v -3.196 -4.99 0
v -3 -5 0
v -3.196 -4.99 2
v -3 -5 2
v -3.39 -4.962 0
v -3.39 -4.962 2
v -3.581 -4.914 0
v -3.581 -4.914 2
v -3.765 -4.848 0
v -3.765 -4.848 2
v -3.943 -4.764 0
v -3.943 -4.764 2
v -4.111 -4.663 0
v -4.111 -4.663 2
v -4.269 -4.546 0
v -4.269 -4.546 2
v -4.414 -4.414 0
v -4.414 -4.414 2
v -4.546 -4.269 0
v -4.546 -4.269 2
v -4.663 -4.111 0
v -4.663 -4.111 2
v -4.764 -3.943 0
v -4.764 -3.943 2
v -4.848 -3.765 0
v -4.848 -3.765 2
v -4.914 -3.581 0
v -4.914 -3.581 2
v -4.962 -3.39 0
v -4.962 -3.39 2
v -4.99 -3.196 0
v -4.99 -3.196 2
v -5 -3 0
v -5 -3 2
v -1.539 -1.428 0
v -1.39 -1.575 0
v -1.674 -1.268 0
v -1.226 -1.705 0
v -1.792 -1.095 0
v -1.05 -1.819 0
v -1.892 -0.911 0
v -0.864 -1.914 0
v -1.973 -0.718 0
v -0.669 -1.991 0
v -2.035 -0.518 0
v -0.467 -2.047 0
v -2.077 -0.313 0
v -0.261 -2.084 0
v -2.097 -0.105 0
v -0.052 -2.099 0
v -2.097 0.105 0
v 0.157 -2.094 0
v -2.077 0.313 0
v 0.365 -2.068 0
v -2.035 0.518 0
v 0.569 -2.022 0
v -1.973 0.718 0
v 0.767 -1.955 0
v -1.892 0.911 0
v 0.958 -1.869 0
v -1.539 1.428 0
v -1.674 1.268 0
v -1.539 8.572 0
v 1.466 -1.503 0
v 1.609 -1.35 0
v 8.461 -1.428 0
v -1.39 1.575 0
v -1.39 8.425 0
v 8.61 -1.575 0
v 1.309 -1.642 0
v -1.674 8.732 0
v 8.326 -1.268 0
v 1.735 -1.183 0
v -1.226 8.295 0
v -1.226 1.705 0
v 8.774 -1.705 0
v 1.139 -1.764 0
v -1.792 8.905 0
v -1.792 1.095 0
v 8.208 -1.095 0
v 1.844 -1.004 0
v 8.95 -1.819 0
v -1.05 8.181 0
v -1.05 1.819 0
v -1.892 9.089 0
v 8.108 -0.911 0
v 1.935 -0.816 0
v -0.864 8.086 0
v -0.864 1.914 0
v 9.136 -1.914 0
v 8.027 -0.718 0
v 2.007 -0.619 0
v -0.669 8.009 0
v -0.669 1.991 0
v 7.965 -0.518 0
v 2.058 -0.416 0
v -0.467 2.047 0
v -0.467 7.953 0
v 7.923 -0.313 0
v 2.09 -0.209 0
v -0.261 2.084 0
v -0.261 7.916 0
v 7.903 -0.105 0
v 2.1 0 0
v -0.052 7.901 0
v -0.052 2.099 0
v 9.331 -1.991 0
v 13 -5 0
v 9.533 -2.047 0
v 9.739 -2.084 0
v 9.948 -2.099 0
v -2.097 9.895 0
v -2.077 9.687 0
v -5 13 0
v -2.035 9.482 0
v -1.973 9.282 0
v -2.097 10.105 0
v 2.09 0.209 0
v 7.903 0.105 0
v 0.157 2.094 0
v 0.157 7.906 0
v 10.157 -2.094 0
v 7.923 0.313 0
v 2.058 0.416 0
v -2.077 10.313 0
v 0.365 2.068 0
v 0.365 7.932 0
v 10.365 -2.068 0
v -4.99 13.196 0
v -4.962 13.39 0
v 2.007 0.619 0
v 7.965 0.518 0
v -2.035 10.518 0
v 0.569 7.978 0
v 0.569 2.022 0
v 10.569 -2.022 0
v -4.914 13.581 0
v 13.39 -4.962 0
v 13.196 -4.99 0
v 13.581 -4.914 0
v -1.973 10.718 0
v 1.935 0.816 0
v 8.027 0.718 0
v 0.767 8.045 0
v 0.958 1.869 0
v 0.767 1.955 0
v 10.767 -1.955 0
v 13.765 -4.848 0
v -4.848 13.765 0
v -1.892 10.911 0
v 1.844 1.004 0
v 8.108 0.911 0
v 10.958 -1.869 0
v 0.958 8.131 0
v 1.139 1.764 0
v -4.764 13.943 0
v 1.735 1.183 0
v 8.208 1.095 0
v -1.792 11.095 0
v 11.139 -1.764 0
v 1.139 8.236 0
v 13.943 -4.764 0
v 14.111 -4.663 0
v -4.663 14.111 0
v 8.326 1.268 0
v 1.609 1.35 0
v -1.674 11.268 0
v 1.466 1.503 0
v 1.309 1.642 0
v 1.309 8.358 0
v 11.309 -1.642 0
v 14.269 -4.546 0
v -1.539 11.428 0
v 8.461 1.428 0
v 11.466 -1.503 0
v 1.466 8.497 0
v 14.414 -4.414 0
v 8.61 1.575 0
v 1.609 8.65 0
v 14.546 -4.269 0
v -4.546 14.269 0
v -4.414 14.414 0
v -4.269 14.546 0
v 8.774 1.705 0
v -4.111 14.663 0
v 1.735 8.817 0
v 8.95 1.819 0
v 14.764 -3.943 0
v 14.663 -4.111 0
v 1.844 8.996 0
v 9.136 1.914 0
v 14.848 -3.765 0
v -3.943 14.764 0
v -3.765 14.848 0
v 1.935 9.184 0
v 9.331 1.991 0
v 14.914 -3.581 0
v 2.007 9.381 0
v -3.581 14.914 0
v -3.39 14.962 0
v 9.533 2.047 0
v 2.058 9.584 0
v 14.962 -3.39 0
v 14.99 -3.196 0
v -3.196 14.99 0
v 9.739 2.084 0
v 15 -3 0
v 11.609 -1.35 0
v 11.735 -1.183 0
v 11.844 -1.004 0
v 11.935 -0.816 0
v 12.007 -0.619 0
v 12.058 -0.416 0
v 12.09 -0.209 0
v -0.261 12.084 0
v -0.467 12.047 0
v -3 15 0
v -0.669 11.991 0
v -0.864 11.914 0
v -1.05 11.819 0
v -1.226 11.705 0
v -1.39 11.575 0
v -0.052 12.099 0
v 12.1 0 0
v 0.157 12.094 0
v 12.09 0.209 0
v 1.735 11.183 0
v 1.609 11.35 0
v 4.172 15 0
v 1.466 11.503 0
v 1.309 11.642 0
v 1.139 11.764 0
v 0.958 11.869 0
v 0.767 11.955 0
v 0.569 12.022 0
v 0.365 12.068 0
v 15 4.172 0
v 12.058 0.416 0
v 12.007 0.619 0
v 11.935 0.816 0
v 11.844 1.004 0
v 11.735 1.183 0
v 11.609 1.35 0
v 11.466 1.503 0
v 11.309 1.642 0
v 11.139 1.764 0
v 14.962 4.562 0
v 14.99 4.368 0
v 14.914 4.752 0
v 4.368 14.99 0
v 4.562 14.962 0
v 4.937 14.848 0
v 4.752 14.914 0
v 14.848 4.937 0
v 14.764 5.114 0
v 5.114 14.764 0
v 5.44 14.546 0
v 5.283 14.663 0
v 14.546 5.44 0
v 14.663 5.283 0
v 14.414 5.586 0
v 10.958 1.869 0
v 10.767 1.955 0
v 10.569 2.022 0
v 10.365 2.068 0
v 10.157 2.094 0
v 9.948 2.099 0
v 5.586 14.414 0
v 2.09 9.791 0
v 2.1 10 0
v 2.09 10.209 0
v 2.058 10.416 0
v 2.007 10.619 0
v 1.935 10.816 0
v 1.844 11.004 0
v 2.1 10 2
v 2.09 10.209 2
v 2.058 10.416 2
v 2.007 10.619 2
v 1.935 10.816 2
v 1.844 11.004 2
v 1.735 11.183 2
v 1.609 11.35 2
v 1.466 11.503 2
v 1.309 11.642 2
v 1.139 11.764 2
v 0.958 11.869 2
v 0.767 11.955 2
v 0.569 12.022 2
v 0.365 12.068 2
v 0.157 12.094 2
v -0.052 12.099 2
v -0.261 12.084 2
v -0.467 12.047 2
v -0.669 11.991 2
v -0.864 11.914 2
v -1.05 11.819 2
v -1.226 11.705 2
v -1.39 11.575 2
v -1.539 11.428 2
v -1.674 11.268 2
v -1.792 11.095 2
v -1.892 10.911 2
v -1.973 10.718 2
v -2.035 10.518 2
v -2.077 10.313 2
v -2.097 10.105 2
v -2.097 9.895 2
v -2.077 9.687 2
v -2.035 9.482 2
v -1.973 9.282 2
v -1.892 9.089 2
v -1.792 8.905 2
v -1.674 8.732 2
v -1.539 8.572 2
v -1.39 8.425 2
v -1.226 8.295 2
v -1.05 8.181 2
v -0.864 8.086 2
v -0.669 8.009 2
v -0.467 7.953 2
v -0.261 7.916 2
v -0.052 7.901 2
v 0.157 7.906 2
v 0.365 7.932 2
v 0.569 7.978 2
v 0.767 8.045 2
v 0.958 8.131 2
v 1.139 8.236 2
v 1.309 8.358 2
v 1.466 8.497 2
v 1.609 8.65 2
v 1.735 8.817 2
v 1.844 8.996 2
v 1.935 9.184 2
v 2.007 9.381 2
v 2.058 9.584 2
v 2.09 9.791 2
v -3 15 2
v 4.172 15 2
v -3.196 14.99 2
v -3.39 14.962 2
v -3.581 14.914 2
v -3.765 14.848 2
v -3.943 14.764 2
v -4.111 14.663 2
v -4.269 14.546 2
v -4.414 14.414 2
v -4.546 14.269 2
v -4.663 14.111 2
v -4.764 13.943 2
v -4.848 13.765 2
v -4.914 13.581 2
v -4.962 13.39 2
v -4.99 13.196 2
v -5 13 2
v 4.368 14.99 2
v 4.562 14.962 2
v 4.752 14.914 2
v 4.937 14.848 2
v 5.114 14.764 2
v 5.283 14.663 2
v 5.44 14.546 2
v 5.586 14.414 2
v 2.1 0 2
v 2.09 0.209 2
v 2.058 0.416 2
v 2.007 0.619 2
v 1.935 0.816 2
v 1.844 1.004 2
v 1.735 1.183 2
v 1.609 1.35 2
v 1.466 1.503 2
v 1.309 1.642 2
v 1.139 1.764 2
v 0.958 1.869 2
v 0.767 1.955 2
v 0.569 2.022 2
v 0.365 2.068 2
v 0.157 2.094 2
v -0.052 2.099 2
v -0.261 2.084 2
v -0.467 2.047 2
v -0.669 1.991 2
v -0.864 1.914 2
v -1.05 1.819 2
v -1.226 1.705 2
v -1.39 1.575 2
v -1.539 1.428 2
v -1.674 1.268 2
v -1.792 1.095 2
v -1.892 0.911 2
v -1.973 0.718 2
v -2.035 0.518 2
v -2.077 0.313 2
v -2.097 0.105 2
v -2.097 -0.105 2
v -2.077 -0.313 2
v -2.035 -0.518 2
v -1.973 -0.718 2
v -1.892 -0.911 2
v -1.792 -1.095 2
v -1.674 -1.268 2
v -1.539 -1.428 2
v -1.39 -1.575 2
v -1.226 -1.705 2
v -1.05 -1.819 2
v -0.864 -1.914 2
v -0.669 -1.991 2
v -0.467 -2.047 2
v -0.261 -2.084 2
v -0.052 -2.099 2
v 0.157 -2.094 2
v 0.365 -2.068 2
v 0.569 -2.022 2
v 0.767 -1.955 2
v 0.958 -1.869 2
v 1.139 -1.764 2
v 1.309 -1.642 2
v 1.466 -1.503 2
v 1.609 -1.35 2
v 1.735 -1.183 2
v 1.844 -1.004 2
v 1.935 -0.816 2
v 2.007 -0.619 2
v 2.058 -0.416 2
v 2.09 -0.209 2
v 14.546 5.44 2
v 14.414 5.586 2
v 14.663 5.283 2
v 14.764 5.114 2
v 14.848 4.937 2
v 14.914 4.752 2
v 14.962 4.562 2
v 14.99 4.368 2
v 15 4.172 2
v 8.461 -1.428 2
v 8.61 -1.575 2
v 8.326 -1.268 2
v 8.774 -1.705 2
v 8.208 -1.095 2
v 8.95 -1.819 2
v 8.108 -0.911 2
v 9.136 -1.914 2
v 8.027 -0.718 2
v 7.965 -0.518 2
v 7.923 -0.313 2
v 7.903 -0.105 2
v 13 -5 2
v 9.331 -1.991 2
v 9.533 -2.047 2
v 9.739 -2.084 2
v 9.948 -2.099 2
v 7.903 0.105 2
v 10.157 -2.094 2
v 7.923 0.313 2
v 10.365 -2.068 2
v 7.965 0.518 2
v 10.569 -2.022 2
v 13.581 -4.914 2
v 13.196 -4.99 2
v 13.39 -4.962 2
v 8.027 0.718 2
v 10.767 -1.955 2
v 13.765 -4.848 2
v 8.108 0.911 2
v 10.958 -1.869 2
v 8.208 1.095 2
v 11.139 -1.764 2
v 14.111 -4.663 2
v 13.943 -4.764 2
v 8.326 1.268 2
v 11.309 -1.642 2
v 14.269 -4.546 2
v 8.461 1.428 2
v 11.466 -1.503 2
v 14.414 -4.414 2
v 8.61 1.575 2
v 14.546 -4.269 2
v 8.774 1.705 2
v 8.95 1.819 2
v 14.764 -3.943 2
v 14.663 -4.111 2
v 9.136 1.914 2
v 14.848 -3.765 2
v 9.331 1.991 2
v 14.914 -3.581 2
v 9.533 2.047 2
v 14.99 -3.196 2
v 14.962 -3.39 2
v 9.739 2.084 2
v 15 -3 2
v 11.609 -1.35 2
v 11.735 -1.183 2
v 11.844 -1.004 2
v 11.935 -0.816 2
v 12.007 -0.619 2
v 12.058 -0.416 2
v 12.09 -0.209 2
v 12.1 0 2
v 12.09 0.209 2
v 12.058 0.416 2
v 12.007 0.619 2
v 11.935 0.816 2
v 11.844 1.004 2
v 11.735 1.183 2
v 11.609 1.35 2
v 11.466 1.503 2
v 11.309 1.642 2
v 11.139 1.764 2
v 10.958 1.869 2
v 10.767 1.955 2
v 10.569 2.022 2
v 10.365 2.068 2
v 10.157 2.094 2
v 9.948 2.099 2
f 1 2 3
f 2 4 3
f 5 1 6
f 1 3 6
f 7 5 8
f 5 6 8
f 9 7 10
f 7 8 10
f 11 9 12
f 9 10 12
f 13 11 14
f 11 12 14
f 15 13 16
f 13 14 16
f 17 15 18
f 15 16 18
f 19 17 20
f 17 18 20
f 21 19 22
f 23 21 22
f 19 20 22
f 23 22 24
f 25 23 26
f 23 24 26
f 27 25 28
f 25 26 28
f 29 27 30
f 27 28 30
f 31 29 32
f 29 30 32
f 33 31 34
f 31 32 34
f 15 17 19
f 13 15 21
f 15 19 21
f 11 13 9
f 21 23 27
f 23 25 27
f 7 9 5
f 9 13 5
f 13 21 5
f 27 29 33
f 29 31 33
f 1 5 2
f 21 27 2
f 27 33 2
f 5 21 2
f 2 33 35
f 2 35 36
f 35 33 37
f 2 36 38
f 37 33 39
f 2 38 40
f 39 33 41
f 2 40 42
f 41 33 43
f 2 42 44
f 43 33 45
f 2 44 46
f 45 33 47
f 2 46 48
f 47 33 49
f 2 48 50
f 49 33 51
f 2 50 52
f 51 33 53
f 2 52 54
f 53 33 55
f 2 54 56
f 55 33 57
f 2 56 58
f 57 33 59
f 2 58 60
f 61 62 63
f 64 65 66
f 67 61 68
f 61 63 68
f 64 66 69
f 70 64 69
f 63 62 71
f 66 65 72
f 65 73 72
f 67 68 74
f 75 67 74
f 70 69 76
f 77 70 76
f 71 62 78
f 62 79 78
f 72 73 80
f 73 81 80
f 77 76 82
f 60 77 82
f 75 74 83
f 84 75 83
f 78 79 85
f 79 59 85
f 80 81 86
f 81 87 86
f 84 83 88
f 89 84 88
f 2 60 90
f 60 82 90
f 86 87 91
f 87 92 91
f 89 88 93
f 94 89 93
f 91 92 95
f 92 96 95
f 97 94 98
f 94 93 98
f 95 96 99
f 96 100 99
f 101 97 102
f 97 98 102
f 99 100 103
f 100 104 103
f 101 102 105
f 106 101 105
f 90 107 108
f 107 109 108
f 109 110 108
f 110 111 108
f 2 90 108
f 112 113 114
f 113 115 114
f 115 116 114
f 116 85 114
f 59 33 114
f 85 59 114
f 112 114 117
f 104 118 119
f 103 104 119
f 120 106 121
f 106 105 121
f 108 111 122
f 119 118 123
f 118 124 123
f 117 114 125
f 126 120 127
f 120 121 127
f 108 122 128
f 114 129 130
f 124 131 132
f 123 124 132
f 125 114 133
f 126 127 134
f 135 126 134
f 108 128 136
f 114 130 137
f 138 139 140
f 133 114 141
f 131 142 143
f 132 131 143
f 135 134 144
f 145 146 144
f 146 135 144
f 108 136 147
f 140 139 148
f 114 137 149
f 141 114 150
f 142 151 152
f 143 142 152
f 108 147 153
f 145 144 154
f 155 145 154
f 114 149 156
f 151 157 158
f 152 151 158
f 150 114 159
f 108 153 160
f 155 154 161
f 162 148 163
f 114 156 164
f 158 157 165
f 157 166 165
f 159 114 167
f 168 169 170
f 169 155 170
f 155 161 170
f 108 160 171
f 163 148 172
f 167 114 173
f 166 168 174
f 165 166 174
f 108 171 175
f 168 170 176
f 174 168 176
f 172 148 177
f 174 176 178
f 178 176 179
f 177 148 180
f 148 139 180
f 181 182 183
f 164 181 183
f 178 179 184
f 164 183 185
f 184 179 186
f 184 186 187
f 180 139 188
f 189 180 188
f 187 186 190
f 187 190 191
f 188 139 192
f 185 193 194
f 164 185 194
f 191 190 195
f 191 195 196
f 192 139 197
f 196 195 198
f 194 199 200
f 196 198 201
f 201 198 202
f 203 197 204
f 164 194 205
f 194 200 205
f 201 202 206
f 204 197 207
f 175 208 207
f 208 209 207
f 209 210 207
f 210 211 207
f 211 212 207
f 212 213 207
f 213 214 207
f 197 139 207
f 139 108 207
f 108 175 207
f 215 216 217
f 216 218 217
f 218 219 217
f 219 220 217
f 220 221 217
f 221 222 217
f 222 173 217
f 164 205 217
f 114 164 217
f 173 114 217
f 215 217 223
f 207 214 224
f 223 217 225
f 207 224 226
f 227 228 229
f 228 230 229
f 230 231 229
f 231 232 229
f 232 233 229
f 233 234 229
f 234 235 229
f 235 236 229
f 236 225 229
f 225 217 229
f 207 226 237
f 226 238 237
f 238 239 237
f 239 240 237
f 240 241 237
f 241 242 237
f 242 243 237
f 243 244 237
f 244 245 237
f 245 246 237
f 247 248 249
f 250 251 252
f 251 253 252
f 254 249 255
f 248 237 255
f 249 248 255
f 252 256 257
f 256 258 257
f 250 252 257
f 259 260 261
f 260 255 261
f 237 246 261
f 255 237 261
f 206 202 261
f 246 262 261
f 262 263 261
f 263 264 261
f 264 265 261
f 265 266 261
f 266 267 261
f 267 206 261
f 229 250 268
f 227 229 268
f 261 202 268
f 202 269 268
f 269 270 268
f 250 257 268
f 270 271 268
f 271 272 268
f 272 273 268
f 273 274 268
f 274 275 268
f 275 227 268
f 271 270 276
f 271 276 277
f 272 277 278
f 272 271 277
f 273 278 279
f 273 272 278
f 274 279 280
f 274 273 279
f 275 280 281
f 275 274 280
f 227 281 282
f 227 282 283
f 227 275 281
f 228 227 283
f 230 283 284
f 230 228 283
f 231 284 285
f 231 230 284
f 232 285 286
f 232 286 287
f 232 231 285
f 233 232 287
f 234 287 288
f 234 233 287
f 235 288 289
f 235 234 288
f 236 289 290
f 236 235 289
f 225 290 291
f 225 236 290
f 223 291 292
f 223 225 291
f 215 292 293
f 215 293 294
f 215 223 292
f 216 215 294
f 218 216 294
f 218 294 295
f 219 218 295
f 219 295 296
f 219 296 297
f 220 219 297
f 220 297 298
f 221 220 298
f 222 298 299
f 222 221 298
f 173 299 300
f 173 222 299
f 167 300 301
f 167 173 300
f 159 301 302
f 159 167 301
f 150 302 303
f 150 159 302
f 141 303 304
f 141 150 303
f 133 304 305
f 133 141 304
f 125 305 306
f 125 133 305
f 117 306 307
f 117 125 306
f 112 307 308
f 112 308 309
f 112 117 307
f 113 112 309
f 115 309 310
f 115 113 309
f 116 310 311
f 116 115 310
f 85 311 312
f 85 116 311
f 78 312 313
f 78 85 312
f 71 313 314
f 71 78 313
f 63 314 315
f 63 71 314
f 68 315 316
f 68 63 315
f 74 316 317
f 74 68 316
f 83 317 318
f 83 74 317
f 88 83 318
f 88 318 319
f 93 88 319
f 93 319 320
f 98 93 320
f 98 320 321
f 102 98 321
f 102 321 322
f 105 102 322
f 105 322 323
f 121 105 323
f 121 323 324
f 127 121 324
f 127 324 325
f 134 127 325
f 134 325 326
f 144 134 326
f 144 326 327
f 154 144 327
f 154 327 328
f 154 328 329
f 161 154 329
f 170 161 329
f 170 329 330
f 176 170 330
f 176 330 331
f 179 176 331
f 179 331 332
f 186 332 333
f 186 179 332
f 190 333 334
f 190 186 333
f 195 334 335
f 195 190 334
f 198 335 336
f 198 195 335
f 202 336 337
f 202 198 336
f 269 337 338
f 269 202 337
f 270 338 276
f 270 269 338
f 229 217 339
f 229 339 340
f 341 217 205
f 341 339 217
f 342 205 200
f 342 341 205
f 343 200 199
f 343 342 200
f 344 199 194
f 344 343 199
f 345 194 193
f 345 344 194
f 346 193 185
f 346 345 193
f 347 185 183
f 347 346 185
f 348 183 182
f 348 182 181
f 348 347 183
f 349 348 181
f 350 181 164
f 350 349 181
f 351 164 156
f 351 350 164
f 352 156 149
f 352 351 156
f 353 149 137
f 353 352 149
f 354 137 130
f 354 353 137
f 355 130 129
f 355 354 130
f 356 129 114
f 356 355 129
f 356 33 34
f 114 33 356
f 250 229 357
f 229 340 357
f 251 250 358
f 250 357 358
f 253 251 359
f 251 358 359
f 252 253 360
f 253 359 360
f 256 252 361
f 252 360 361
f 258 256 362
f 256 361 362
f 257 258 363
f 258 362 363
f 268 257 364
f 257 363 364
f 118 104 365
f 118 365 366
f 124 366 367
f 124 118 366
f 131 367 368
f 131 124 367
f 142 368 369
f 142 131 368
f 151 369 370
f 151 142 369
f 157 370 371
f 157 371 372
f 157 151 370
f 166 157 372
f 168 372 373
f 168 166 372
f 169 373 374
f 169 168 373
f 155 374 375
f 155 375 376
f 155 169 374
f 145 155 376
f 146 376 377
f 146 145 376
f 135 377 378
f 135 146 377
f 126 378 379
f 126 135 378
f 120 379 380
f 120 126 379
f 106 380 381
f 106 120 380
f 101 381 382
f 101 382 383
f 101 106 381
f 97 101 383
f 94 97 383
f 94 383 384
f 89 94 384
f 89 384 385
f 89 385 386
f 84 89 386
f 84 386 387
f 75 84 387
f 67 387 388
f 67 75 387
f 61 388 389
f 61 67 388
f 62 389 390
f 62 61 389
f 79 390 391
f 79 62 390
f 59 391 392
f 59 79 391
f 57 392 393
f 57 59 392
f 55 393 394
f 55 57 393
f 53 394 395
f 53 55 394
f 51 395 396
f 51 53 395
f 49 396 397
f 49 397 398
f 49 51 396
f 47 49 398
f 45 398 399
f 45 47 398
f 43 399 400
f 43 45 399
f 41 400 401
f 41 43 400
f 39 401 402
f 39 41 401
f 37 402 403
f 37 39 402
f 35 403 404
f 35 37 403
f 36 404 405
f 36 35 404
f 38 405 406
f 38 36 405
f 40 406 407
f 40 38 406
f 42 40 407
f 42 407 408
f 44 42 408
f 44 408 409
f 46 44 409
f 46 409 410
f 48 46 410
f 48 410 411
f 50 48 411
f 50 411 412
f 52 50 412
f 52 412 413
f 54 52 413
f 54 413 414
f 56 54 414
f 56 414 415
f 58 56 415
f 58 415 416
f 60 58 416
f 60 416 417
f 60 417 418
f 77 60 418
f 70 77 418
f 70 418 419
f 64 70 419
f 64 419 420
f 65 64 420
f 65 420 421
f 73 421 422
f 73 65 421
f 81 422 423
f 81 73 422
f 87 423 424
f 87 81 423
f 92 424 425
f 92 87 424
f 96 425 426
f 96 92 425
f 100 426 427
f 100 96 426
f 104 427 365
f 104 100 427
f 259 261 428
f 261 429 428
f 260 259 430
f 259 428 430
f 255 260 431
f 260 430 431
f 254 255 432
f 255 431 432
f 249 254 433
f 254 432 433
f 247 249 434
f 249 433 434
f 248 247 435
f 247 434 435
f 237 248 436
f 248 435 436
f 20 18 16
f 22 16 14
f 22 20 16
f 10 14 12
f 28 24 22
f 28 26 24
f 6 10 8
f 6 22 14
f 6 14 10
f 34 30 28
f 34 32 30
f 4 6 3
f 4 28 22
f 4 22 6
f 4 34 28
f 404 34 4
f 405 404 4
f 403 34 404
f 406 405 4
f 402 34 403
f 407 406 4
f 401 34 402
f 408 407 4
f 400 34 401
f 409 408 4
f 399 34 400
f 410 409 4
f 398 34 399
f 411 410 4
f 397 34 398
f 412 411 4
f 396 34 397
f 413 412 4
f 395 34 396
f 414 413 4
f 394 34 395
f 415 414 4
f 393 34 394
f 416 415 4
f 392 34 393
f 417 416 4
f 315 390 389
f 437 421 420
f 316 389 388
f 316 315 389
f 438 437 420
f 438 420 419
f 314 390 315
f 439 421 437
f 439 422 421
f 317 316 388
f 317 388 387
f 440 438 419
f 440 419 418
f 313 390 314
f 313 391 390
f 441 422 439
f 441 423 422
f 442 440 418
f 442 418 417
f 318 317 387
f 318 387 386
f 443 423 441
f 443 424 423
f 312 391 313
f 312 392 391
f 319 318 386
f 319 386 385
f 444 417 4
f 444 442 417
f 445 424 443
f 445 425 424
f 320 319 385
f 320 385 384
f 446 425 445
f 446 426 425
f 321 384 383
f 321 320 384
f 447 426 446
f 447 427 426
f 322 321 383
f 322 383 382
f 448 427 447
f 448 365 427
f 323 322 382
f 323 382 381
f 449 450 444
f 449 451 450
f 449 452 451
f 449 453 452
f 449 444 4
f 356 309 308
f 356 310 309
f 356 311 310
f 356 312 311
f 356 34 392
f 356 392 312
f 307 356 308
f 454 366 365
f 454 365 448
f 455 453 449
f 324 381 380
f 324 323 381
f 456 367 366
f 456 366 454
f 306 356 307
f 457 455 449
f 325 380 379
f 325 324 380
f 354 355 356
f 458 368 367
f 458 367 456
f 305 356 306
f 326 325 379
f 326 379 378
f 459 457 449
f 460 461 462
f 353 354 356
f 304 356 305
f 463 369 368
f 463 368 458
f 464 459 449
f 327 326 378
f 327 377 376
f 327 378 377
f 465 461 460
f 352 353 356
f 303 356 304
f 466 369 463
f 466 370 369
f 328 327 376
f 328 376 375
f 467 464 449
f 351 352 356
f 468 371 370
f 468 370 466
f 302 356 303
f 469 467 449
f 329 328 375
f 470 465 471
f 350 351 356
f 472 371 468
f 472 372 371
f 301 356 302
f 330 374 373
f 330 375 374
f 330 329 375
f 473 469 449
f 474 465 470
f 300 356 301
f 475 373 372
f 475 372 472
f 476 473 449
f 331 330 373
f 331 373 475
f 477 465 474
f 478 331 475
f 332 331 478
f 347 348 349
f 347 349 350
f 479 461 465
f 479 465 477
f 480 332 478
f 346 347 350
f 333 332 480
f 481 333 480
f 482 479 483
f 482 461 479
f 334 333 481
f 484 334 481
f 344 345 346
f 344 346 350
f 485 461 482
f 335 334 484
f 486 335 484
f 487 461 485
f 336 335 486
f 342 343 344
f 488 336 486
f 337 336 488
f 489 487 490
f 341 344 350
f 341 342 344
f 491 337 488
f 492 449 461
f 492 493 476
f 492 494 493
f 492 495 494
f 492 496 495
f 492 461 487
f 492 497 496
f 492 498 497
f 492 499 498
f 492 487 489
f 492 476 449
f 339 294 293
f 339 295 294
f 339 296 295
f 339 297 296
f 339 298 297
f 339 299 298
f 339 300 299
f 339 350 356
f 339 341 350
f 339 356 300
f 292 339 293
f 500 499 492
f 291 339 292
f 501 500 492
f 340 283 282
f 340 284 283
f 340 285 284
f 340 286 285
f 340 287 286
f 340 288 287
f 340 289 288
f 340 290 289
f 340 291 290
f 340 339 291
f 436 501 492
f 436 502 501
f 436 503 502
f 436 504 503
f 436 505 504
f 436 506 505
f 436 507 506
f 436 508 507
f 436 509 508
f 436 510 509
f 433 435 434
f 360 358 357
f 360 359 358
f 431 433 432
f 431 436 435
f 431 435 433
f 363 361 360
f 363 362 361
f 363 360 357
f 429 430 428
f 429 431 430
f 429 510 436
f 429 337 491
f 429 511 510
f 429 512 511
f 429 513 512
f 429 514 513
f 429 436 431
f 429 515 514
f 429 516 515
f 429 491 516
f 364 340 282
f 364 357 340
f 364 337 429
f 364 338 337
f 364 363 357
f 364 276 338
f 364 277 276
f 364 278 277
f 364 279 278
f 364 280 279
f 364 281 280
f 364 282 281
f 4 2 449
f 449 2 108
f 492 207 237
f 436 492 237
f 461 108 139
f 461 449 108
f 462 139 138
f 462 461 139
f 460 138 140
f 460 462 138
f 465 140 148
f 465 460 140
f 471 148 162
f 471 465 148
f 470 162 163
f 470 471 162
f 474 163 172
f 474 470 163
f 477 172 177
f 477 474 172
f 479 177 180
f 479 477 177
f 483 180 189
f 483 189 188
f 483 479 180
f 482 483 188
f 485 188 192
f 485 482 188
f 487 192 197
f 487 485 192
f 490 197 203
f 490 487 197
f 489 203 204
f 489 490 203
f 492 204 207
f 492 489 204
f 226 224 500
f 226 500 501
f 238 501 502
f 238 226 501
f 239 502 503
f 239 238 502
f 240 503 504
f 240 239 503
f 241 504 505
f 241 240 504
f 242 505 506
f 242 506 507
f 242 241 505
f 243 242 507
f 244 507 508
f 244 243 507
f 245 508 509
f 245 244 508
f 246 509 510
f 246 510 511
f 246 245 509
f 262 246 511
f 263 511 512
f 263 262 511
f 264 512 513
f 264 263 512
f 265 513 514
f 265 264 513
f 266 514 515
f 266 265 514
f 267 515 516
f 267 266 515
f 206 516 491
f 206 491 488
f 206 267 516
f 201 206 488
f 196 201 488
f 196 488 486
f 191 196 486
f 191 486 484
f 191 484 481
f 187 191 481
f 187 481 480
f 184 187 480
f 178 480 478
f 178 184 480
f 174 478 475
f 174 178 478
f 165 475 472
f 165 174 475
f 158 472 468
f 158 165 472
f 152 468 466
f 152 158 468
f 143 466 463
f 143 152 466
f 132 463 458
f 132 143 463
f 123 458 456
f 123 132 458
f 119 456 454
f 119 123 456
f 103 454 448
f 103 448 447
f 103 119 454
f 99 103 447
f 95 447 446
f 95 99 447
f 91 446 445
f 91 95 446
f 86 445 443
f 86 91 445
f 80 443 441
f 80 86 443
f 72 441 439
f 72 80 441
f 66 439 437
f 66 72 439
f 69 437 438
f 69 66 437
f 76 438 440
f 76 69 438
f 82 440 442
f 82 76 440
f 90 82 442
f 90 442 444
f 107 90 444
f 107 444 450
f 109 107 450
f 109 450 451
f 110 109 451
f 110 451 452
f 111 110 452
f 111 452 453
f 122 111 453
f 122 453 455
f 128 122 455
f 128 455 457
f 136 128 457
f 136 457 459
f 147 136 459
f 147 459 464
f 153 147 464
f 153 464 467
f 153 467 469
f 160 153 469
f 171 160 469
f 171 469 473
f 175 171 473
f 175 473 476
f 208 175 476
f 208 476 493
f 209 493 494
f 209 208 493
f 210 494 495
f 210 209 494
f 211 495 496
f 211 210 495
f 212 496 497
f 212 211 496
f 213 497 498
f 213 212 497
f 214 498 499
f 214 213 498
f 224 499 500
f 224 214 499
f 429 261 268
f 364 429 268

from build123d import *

# Parameters (mm, degrees)
SKETCH_1_W      = 10
SKETCH_1_H      = 10
SKETCH_1_R      = 2.1
EXTRUDE_1_DEPTH = 2
FILLET_1_R      = 2


with BuildPart() as part:
    # ｽｹｯﾁ1 → ﾎﾞｽ - 押し出し1 (new body)
    # profile 1 of 4: a face of its own
    with BuildSketch(Plane.XY):
        with Locations((0, 10)):
            Rectangle(SKETCH_1_W, SKETCH_1_H)
        with Locations((0, 10)):
            Circle(SKETCH_1_R, mode=Mode.SUBTRACT)
    # profile 2 of 4: a face of its own
    with BuildSketch(Plane.XY):
        Polygon((15, 5), (5, 15), (5, 5), align=None)
    # profile 3 of 4: a face of its own
    with BuildSketch(Plane.XY):
        Rectangle(SKETCH_1_W, SKETCH_1_H)
        Circle(SKETCH_1_R, mode=Mode.SUBTRACT)
    # profile 4 of 4: a face of its own
    with BuildSketch(Plane.XY):
        with Locations((10, 0)):
            Rectangle(SKETCH_1_W, SKETCH_1_H)
        with Locations((10, 0)):
            Circle(SKETCH_1_R, mode=Mode.SUBTRACT)
    extrude(amount=EXTRUDE_1_DEPTH)

    # ﾌｨﾚｯﾄ1
    fillet_1_edges = [part.edges().sort_by_distance(p)[0] for p in [
        (-5, -5, 1),
        (-5, 15, 1),
        (5, 15, 1),
        (15, 5, 1),
        (15, -5, 1),
    ]]
    fillet(fillet_1_edges, radius=FILLET_1_R)


solid = part.part
